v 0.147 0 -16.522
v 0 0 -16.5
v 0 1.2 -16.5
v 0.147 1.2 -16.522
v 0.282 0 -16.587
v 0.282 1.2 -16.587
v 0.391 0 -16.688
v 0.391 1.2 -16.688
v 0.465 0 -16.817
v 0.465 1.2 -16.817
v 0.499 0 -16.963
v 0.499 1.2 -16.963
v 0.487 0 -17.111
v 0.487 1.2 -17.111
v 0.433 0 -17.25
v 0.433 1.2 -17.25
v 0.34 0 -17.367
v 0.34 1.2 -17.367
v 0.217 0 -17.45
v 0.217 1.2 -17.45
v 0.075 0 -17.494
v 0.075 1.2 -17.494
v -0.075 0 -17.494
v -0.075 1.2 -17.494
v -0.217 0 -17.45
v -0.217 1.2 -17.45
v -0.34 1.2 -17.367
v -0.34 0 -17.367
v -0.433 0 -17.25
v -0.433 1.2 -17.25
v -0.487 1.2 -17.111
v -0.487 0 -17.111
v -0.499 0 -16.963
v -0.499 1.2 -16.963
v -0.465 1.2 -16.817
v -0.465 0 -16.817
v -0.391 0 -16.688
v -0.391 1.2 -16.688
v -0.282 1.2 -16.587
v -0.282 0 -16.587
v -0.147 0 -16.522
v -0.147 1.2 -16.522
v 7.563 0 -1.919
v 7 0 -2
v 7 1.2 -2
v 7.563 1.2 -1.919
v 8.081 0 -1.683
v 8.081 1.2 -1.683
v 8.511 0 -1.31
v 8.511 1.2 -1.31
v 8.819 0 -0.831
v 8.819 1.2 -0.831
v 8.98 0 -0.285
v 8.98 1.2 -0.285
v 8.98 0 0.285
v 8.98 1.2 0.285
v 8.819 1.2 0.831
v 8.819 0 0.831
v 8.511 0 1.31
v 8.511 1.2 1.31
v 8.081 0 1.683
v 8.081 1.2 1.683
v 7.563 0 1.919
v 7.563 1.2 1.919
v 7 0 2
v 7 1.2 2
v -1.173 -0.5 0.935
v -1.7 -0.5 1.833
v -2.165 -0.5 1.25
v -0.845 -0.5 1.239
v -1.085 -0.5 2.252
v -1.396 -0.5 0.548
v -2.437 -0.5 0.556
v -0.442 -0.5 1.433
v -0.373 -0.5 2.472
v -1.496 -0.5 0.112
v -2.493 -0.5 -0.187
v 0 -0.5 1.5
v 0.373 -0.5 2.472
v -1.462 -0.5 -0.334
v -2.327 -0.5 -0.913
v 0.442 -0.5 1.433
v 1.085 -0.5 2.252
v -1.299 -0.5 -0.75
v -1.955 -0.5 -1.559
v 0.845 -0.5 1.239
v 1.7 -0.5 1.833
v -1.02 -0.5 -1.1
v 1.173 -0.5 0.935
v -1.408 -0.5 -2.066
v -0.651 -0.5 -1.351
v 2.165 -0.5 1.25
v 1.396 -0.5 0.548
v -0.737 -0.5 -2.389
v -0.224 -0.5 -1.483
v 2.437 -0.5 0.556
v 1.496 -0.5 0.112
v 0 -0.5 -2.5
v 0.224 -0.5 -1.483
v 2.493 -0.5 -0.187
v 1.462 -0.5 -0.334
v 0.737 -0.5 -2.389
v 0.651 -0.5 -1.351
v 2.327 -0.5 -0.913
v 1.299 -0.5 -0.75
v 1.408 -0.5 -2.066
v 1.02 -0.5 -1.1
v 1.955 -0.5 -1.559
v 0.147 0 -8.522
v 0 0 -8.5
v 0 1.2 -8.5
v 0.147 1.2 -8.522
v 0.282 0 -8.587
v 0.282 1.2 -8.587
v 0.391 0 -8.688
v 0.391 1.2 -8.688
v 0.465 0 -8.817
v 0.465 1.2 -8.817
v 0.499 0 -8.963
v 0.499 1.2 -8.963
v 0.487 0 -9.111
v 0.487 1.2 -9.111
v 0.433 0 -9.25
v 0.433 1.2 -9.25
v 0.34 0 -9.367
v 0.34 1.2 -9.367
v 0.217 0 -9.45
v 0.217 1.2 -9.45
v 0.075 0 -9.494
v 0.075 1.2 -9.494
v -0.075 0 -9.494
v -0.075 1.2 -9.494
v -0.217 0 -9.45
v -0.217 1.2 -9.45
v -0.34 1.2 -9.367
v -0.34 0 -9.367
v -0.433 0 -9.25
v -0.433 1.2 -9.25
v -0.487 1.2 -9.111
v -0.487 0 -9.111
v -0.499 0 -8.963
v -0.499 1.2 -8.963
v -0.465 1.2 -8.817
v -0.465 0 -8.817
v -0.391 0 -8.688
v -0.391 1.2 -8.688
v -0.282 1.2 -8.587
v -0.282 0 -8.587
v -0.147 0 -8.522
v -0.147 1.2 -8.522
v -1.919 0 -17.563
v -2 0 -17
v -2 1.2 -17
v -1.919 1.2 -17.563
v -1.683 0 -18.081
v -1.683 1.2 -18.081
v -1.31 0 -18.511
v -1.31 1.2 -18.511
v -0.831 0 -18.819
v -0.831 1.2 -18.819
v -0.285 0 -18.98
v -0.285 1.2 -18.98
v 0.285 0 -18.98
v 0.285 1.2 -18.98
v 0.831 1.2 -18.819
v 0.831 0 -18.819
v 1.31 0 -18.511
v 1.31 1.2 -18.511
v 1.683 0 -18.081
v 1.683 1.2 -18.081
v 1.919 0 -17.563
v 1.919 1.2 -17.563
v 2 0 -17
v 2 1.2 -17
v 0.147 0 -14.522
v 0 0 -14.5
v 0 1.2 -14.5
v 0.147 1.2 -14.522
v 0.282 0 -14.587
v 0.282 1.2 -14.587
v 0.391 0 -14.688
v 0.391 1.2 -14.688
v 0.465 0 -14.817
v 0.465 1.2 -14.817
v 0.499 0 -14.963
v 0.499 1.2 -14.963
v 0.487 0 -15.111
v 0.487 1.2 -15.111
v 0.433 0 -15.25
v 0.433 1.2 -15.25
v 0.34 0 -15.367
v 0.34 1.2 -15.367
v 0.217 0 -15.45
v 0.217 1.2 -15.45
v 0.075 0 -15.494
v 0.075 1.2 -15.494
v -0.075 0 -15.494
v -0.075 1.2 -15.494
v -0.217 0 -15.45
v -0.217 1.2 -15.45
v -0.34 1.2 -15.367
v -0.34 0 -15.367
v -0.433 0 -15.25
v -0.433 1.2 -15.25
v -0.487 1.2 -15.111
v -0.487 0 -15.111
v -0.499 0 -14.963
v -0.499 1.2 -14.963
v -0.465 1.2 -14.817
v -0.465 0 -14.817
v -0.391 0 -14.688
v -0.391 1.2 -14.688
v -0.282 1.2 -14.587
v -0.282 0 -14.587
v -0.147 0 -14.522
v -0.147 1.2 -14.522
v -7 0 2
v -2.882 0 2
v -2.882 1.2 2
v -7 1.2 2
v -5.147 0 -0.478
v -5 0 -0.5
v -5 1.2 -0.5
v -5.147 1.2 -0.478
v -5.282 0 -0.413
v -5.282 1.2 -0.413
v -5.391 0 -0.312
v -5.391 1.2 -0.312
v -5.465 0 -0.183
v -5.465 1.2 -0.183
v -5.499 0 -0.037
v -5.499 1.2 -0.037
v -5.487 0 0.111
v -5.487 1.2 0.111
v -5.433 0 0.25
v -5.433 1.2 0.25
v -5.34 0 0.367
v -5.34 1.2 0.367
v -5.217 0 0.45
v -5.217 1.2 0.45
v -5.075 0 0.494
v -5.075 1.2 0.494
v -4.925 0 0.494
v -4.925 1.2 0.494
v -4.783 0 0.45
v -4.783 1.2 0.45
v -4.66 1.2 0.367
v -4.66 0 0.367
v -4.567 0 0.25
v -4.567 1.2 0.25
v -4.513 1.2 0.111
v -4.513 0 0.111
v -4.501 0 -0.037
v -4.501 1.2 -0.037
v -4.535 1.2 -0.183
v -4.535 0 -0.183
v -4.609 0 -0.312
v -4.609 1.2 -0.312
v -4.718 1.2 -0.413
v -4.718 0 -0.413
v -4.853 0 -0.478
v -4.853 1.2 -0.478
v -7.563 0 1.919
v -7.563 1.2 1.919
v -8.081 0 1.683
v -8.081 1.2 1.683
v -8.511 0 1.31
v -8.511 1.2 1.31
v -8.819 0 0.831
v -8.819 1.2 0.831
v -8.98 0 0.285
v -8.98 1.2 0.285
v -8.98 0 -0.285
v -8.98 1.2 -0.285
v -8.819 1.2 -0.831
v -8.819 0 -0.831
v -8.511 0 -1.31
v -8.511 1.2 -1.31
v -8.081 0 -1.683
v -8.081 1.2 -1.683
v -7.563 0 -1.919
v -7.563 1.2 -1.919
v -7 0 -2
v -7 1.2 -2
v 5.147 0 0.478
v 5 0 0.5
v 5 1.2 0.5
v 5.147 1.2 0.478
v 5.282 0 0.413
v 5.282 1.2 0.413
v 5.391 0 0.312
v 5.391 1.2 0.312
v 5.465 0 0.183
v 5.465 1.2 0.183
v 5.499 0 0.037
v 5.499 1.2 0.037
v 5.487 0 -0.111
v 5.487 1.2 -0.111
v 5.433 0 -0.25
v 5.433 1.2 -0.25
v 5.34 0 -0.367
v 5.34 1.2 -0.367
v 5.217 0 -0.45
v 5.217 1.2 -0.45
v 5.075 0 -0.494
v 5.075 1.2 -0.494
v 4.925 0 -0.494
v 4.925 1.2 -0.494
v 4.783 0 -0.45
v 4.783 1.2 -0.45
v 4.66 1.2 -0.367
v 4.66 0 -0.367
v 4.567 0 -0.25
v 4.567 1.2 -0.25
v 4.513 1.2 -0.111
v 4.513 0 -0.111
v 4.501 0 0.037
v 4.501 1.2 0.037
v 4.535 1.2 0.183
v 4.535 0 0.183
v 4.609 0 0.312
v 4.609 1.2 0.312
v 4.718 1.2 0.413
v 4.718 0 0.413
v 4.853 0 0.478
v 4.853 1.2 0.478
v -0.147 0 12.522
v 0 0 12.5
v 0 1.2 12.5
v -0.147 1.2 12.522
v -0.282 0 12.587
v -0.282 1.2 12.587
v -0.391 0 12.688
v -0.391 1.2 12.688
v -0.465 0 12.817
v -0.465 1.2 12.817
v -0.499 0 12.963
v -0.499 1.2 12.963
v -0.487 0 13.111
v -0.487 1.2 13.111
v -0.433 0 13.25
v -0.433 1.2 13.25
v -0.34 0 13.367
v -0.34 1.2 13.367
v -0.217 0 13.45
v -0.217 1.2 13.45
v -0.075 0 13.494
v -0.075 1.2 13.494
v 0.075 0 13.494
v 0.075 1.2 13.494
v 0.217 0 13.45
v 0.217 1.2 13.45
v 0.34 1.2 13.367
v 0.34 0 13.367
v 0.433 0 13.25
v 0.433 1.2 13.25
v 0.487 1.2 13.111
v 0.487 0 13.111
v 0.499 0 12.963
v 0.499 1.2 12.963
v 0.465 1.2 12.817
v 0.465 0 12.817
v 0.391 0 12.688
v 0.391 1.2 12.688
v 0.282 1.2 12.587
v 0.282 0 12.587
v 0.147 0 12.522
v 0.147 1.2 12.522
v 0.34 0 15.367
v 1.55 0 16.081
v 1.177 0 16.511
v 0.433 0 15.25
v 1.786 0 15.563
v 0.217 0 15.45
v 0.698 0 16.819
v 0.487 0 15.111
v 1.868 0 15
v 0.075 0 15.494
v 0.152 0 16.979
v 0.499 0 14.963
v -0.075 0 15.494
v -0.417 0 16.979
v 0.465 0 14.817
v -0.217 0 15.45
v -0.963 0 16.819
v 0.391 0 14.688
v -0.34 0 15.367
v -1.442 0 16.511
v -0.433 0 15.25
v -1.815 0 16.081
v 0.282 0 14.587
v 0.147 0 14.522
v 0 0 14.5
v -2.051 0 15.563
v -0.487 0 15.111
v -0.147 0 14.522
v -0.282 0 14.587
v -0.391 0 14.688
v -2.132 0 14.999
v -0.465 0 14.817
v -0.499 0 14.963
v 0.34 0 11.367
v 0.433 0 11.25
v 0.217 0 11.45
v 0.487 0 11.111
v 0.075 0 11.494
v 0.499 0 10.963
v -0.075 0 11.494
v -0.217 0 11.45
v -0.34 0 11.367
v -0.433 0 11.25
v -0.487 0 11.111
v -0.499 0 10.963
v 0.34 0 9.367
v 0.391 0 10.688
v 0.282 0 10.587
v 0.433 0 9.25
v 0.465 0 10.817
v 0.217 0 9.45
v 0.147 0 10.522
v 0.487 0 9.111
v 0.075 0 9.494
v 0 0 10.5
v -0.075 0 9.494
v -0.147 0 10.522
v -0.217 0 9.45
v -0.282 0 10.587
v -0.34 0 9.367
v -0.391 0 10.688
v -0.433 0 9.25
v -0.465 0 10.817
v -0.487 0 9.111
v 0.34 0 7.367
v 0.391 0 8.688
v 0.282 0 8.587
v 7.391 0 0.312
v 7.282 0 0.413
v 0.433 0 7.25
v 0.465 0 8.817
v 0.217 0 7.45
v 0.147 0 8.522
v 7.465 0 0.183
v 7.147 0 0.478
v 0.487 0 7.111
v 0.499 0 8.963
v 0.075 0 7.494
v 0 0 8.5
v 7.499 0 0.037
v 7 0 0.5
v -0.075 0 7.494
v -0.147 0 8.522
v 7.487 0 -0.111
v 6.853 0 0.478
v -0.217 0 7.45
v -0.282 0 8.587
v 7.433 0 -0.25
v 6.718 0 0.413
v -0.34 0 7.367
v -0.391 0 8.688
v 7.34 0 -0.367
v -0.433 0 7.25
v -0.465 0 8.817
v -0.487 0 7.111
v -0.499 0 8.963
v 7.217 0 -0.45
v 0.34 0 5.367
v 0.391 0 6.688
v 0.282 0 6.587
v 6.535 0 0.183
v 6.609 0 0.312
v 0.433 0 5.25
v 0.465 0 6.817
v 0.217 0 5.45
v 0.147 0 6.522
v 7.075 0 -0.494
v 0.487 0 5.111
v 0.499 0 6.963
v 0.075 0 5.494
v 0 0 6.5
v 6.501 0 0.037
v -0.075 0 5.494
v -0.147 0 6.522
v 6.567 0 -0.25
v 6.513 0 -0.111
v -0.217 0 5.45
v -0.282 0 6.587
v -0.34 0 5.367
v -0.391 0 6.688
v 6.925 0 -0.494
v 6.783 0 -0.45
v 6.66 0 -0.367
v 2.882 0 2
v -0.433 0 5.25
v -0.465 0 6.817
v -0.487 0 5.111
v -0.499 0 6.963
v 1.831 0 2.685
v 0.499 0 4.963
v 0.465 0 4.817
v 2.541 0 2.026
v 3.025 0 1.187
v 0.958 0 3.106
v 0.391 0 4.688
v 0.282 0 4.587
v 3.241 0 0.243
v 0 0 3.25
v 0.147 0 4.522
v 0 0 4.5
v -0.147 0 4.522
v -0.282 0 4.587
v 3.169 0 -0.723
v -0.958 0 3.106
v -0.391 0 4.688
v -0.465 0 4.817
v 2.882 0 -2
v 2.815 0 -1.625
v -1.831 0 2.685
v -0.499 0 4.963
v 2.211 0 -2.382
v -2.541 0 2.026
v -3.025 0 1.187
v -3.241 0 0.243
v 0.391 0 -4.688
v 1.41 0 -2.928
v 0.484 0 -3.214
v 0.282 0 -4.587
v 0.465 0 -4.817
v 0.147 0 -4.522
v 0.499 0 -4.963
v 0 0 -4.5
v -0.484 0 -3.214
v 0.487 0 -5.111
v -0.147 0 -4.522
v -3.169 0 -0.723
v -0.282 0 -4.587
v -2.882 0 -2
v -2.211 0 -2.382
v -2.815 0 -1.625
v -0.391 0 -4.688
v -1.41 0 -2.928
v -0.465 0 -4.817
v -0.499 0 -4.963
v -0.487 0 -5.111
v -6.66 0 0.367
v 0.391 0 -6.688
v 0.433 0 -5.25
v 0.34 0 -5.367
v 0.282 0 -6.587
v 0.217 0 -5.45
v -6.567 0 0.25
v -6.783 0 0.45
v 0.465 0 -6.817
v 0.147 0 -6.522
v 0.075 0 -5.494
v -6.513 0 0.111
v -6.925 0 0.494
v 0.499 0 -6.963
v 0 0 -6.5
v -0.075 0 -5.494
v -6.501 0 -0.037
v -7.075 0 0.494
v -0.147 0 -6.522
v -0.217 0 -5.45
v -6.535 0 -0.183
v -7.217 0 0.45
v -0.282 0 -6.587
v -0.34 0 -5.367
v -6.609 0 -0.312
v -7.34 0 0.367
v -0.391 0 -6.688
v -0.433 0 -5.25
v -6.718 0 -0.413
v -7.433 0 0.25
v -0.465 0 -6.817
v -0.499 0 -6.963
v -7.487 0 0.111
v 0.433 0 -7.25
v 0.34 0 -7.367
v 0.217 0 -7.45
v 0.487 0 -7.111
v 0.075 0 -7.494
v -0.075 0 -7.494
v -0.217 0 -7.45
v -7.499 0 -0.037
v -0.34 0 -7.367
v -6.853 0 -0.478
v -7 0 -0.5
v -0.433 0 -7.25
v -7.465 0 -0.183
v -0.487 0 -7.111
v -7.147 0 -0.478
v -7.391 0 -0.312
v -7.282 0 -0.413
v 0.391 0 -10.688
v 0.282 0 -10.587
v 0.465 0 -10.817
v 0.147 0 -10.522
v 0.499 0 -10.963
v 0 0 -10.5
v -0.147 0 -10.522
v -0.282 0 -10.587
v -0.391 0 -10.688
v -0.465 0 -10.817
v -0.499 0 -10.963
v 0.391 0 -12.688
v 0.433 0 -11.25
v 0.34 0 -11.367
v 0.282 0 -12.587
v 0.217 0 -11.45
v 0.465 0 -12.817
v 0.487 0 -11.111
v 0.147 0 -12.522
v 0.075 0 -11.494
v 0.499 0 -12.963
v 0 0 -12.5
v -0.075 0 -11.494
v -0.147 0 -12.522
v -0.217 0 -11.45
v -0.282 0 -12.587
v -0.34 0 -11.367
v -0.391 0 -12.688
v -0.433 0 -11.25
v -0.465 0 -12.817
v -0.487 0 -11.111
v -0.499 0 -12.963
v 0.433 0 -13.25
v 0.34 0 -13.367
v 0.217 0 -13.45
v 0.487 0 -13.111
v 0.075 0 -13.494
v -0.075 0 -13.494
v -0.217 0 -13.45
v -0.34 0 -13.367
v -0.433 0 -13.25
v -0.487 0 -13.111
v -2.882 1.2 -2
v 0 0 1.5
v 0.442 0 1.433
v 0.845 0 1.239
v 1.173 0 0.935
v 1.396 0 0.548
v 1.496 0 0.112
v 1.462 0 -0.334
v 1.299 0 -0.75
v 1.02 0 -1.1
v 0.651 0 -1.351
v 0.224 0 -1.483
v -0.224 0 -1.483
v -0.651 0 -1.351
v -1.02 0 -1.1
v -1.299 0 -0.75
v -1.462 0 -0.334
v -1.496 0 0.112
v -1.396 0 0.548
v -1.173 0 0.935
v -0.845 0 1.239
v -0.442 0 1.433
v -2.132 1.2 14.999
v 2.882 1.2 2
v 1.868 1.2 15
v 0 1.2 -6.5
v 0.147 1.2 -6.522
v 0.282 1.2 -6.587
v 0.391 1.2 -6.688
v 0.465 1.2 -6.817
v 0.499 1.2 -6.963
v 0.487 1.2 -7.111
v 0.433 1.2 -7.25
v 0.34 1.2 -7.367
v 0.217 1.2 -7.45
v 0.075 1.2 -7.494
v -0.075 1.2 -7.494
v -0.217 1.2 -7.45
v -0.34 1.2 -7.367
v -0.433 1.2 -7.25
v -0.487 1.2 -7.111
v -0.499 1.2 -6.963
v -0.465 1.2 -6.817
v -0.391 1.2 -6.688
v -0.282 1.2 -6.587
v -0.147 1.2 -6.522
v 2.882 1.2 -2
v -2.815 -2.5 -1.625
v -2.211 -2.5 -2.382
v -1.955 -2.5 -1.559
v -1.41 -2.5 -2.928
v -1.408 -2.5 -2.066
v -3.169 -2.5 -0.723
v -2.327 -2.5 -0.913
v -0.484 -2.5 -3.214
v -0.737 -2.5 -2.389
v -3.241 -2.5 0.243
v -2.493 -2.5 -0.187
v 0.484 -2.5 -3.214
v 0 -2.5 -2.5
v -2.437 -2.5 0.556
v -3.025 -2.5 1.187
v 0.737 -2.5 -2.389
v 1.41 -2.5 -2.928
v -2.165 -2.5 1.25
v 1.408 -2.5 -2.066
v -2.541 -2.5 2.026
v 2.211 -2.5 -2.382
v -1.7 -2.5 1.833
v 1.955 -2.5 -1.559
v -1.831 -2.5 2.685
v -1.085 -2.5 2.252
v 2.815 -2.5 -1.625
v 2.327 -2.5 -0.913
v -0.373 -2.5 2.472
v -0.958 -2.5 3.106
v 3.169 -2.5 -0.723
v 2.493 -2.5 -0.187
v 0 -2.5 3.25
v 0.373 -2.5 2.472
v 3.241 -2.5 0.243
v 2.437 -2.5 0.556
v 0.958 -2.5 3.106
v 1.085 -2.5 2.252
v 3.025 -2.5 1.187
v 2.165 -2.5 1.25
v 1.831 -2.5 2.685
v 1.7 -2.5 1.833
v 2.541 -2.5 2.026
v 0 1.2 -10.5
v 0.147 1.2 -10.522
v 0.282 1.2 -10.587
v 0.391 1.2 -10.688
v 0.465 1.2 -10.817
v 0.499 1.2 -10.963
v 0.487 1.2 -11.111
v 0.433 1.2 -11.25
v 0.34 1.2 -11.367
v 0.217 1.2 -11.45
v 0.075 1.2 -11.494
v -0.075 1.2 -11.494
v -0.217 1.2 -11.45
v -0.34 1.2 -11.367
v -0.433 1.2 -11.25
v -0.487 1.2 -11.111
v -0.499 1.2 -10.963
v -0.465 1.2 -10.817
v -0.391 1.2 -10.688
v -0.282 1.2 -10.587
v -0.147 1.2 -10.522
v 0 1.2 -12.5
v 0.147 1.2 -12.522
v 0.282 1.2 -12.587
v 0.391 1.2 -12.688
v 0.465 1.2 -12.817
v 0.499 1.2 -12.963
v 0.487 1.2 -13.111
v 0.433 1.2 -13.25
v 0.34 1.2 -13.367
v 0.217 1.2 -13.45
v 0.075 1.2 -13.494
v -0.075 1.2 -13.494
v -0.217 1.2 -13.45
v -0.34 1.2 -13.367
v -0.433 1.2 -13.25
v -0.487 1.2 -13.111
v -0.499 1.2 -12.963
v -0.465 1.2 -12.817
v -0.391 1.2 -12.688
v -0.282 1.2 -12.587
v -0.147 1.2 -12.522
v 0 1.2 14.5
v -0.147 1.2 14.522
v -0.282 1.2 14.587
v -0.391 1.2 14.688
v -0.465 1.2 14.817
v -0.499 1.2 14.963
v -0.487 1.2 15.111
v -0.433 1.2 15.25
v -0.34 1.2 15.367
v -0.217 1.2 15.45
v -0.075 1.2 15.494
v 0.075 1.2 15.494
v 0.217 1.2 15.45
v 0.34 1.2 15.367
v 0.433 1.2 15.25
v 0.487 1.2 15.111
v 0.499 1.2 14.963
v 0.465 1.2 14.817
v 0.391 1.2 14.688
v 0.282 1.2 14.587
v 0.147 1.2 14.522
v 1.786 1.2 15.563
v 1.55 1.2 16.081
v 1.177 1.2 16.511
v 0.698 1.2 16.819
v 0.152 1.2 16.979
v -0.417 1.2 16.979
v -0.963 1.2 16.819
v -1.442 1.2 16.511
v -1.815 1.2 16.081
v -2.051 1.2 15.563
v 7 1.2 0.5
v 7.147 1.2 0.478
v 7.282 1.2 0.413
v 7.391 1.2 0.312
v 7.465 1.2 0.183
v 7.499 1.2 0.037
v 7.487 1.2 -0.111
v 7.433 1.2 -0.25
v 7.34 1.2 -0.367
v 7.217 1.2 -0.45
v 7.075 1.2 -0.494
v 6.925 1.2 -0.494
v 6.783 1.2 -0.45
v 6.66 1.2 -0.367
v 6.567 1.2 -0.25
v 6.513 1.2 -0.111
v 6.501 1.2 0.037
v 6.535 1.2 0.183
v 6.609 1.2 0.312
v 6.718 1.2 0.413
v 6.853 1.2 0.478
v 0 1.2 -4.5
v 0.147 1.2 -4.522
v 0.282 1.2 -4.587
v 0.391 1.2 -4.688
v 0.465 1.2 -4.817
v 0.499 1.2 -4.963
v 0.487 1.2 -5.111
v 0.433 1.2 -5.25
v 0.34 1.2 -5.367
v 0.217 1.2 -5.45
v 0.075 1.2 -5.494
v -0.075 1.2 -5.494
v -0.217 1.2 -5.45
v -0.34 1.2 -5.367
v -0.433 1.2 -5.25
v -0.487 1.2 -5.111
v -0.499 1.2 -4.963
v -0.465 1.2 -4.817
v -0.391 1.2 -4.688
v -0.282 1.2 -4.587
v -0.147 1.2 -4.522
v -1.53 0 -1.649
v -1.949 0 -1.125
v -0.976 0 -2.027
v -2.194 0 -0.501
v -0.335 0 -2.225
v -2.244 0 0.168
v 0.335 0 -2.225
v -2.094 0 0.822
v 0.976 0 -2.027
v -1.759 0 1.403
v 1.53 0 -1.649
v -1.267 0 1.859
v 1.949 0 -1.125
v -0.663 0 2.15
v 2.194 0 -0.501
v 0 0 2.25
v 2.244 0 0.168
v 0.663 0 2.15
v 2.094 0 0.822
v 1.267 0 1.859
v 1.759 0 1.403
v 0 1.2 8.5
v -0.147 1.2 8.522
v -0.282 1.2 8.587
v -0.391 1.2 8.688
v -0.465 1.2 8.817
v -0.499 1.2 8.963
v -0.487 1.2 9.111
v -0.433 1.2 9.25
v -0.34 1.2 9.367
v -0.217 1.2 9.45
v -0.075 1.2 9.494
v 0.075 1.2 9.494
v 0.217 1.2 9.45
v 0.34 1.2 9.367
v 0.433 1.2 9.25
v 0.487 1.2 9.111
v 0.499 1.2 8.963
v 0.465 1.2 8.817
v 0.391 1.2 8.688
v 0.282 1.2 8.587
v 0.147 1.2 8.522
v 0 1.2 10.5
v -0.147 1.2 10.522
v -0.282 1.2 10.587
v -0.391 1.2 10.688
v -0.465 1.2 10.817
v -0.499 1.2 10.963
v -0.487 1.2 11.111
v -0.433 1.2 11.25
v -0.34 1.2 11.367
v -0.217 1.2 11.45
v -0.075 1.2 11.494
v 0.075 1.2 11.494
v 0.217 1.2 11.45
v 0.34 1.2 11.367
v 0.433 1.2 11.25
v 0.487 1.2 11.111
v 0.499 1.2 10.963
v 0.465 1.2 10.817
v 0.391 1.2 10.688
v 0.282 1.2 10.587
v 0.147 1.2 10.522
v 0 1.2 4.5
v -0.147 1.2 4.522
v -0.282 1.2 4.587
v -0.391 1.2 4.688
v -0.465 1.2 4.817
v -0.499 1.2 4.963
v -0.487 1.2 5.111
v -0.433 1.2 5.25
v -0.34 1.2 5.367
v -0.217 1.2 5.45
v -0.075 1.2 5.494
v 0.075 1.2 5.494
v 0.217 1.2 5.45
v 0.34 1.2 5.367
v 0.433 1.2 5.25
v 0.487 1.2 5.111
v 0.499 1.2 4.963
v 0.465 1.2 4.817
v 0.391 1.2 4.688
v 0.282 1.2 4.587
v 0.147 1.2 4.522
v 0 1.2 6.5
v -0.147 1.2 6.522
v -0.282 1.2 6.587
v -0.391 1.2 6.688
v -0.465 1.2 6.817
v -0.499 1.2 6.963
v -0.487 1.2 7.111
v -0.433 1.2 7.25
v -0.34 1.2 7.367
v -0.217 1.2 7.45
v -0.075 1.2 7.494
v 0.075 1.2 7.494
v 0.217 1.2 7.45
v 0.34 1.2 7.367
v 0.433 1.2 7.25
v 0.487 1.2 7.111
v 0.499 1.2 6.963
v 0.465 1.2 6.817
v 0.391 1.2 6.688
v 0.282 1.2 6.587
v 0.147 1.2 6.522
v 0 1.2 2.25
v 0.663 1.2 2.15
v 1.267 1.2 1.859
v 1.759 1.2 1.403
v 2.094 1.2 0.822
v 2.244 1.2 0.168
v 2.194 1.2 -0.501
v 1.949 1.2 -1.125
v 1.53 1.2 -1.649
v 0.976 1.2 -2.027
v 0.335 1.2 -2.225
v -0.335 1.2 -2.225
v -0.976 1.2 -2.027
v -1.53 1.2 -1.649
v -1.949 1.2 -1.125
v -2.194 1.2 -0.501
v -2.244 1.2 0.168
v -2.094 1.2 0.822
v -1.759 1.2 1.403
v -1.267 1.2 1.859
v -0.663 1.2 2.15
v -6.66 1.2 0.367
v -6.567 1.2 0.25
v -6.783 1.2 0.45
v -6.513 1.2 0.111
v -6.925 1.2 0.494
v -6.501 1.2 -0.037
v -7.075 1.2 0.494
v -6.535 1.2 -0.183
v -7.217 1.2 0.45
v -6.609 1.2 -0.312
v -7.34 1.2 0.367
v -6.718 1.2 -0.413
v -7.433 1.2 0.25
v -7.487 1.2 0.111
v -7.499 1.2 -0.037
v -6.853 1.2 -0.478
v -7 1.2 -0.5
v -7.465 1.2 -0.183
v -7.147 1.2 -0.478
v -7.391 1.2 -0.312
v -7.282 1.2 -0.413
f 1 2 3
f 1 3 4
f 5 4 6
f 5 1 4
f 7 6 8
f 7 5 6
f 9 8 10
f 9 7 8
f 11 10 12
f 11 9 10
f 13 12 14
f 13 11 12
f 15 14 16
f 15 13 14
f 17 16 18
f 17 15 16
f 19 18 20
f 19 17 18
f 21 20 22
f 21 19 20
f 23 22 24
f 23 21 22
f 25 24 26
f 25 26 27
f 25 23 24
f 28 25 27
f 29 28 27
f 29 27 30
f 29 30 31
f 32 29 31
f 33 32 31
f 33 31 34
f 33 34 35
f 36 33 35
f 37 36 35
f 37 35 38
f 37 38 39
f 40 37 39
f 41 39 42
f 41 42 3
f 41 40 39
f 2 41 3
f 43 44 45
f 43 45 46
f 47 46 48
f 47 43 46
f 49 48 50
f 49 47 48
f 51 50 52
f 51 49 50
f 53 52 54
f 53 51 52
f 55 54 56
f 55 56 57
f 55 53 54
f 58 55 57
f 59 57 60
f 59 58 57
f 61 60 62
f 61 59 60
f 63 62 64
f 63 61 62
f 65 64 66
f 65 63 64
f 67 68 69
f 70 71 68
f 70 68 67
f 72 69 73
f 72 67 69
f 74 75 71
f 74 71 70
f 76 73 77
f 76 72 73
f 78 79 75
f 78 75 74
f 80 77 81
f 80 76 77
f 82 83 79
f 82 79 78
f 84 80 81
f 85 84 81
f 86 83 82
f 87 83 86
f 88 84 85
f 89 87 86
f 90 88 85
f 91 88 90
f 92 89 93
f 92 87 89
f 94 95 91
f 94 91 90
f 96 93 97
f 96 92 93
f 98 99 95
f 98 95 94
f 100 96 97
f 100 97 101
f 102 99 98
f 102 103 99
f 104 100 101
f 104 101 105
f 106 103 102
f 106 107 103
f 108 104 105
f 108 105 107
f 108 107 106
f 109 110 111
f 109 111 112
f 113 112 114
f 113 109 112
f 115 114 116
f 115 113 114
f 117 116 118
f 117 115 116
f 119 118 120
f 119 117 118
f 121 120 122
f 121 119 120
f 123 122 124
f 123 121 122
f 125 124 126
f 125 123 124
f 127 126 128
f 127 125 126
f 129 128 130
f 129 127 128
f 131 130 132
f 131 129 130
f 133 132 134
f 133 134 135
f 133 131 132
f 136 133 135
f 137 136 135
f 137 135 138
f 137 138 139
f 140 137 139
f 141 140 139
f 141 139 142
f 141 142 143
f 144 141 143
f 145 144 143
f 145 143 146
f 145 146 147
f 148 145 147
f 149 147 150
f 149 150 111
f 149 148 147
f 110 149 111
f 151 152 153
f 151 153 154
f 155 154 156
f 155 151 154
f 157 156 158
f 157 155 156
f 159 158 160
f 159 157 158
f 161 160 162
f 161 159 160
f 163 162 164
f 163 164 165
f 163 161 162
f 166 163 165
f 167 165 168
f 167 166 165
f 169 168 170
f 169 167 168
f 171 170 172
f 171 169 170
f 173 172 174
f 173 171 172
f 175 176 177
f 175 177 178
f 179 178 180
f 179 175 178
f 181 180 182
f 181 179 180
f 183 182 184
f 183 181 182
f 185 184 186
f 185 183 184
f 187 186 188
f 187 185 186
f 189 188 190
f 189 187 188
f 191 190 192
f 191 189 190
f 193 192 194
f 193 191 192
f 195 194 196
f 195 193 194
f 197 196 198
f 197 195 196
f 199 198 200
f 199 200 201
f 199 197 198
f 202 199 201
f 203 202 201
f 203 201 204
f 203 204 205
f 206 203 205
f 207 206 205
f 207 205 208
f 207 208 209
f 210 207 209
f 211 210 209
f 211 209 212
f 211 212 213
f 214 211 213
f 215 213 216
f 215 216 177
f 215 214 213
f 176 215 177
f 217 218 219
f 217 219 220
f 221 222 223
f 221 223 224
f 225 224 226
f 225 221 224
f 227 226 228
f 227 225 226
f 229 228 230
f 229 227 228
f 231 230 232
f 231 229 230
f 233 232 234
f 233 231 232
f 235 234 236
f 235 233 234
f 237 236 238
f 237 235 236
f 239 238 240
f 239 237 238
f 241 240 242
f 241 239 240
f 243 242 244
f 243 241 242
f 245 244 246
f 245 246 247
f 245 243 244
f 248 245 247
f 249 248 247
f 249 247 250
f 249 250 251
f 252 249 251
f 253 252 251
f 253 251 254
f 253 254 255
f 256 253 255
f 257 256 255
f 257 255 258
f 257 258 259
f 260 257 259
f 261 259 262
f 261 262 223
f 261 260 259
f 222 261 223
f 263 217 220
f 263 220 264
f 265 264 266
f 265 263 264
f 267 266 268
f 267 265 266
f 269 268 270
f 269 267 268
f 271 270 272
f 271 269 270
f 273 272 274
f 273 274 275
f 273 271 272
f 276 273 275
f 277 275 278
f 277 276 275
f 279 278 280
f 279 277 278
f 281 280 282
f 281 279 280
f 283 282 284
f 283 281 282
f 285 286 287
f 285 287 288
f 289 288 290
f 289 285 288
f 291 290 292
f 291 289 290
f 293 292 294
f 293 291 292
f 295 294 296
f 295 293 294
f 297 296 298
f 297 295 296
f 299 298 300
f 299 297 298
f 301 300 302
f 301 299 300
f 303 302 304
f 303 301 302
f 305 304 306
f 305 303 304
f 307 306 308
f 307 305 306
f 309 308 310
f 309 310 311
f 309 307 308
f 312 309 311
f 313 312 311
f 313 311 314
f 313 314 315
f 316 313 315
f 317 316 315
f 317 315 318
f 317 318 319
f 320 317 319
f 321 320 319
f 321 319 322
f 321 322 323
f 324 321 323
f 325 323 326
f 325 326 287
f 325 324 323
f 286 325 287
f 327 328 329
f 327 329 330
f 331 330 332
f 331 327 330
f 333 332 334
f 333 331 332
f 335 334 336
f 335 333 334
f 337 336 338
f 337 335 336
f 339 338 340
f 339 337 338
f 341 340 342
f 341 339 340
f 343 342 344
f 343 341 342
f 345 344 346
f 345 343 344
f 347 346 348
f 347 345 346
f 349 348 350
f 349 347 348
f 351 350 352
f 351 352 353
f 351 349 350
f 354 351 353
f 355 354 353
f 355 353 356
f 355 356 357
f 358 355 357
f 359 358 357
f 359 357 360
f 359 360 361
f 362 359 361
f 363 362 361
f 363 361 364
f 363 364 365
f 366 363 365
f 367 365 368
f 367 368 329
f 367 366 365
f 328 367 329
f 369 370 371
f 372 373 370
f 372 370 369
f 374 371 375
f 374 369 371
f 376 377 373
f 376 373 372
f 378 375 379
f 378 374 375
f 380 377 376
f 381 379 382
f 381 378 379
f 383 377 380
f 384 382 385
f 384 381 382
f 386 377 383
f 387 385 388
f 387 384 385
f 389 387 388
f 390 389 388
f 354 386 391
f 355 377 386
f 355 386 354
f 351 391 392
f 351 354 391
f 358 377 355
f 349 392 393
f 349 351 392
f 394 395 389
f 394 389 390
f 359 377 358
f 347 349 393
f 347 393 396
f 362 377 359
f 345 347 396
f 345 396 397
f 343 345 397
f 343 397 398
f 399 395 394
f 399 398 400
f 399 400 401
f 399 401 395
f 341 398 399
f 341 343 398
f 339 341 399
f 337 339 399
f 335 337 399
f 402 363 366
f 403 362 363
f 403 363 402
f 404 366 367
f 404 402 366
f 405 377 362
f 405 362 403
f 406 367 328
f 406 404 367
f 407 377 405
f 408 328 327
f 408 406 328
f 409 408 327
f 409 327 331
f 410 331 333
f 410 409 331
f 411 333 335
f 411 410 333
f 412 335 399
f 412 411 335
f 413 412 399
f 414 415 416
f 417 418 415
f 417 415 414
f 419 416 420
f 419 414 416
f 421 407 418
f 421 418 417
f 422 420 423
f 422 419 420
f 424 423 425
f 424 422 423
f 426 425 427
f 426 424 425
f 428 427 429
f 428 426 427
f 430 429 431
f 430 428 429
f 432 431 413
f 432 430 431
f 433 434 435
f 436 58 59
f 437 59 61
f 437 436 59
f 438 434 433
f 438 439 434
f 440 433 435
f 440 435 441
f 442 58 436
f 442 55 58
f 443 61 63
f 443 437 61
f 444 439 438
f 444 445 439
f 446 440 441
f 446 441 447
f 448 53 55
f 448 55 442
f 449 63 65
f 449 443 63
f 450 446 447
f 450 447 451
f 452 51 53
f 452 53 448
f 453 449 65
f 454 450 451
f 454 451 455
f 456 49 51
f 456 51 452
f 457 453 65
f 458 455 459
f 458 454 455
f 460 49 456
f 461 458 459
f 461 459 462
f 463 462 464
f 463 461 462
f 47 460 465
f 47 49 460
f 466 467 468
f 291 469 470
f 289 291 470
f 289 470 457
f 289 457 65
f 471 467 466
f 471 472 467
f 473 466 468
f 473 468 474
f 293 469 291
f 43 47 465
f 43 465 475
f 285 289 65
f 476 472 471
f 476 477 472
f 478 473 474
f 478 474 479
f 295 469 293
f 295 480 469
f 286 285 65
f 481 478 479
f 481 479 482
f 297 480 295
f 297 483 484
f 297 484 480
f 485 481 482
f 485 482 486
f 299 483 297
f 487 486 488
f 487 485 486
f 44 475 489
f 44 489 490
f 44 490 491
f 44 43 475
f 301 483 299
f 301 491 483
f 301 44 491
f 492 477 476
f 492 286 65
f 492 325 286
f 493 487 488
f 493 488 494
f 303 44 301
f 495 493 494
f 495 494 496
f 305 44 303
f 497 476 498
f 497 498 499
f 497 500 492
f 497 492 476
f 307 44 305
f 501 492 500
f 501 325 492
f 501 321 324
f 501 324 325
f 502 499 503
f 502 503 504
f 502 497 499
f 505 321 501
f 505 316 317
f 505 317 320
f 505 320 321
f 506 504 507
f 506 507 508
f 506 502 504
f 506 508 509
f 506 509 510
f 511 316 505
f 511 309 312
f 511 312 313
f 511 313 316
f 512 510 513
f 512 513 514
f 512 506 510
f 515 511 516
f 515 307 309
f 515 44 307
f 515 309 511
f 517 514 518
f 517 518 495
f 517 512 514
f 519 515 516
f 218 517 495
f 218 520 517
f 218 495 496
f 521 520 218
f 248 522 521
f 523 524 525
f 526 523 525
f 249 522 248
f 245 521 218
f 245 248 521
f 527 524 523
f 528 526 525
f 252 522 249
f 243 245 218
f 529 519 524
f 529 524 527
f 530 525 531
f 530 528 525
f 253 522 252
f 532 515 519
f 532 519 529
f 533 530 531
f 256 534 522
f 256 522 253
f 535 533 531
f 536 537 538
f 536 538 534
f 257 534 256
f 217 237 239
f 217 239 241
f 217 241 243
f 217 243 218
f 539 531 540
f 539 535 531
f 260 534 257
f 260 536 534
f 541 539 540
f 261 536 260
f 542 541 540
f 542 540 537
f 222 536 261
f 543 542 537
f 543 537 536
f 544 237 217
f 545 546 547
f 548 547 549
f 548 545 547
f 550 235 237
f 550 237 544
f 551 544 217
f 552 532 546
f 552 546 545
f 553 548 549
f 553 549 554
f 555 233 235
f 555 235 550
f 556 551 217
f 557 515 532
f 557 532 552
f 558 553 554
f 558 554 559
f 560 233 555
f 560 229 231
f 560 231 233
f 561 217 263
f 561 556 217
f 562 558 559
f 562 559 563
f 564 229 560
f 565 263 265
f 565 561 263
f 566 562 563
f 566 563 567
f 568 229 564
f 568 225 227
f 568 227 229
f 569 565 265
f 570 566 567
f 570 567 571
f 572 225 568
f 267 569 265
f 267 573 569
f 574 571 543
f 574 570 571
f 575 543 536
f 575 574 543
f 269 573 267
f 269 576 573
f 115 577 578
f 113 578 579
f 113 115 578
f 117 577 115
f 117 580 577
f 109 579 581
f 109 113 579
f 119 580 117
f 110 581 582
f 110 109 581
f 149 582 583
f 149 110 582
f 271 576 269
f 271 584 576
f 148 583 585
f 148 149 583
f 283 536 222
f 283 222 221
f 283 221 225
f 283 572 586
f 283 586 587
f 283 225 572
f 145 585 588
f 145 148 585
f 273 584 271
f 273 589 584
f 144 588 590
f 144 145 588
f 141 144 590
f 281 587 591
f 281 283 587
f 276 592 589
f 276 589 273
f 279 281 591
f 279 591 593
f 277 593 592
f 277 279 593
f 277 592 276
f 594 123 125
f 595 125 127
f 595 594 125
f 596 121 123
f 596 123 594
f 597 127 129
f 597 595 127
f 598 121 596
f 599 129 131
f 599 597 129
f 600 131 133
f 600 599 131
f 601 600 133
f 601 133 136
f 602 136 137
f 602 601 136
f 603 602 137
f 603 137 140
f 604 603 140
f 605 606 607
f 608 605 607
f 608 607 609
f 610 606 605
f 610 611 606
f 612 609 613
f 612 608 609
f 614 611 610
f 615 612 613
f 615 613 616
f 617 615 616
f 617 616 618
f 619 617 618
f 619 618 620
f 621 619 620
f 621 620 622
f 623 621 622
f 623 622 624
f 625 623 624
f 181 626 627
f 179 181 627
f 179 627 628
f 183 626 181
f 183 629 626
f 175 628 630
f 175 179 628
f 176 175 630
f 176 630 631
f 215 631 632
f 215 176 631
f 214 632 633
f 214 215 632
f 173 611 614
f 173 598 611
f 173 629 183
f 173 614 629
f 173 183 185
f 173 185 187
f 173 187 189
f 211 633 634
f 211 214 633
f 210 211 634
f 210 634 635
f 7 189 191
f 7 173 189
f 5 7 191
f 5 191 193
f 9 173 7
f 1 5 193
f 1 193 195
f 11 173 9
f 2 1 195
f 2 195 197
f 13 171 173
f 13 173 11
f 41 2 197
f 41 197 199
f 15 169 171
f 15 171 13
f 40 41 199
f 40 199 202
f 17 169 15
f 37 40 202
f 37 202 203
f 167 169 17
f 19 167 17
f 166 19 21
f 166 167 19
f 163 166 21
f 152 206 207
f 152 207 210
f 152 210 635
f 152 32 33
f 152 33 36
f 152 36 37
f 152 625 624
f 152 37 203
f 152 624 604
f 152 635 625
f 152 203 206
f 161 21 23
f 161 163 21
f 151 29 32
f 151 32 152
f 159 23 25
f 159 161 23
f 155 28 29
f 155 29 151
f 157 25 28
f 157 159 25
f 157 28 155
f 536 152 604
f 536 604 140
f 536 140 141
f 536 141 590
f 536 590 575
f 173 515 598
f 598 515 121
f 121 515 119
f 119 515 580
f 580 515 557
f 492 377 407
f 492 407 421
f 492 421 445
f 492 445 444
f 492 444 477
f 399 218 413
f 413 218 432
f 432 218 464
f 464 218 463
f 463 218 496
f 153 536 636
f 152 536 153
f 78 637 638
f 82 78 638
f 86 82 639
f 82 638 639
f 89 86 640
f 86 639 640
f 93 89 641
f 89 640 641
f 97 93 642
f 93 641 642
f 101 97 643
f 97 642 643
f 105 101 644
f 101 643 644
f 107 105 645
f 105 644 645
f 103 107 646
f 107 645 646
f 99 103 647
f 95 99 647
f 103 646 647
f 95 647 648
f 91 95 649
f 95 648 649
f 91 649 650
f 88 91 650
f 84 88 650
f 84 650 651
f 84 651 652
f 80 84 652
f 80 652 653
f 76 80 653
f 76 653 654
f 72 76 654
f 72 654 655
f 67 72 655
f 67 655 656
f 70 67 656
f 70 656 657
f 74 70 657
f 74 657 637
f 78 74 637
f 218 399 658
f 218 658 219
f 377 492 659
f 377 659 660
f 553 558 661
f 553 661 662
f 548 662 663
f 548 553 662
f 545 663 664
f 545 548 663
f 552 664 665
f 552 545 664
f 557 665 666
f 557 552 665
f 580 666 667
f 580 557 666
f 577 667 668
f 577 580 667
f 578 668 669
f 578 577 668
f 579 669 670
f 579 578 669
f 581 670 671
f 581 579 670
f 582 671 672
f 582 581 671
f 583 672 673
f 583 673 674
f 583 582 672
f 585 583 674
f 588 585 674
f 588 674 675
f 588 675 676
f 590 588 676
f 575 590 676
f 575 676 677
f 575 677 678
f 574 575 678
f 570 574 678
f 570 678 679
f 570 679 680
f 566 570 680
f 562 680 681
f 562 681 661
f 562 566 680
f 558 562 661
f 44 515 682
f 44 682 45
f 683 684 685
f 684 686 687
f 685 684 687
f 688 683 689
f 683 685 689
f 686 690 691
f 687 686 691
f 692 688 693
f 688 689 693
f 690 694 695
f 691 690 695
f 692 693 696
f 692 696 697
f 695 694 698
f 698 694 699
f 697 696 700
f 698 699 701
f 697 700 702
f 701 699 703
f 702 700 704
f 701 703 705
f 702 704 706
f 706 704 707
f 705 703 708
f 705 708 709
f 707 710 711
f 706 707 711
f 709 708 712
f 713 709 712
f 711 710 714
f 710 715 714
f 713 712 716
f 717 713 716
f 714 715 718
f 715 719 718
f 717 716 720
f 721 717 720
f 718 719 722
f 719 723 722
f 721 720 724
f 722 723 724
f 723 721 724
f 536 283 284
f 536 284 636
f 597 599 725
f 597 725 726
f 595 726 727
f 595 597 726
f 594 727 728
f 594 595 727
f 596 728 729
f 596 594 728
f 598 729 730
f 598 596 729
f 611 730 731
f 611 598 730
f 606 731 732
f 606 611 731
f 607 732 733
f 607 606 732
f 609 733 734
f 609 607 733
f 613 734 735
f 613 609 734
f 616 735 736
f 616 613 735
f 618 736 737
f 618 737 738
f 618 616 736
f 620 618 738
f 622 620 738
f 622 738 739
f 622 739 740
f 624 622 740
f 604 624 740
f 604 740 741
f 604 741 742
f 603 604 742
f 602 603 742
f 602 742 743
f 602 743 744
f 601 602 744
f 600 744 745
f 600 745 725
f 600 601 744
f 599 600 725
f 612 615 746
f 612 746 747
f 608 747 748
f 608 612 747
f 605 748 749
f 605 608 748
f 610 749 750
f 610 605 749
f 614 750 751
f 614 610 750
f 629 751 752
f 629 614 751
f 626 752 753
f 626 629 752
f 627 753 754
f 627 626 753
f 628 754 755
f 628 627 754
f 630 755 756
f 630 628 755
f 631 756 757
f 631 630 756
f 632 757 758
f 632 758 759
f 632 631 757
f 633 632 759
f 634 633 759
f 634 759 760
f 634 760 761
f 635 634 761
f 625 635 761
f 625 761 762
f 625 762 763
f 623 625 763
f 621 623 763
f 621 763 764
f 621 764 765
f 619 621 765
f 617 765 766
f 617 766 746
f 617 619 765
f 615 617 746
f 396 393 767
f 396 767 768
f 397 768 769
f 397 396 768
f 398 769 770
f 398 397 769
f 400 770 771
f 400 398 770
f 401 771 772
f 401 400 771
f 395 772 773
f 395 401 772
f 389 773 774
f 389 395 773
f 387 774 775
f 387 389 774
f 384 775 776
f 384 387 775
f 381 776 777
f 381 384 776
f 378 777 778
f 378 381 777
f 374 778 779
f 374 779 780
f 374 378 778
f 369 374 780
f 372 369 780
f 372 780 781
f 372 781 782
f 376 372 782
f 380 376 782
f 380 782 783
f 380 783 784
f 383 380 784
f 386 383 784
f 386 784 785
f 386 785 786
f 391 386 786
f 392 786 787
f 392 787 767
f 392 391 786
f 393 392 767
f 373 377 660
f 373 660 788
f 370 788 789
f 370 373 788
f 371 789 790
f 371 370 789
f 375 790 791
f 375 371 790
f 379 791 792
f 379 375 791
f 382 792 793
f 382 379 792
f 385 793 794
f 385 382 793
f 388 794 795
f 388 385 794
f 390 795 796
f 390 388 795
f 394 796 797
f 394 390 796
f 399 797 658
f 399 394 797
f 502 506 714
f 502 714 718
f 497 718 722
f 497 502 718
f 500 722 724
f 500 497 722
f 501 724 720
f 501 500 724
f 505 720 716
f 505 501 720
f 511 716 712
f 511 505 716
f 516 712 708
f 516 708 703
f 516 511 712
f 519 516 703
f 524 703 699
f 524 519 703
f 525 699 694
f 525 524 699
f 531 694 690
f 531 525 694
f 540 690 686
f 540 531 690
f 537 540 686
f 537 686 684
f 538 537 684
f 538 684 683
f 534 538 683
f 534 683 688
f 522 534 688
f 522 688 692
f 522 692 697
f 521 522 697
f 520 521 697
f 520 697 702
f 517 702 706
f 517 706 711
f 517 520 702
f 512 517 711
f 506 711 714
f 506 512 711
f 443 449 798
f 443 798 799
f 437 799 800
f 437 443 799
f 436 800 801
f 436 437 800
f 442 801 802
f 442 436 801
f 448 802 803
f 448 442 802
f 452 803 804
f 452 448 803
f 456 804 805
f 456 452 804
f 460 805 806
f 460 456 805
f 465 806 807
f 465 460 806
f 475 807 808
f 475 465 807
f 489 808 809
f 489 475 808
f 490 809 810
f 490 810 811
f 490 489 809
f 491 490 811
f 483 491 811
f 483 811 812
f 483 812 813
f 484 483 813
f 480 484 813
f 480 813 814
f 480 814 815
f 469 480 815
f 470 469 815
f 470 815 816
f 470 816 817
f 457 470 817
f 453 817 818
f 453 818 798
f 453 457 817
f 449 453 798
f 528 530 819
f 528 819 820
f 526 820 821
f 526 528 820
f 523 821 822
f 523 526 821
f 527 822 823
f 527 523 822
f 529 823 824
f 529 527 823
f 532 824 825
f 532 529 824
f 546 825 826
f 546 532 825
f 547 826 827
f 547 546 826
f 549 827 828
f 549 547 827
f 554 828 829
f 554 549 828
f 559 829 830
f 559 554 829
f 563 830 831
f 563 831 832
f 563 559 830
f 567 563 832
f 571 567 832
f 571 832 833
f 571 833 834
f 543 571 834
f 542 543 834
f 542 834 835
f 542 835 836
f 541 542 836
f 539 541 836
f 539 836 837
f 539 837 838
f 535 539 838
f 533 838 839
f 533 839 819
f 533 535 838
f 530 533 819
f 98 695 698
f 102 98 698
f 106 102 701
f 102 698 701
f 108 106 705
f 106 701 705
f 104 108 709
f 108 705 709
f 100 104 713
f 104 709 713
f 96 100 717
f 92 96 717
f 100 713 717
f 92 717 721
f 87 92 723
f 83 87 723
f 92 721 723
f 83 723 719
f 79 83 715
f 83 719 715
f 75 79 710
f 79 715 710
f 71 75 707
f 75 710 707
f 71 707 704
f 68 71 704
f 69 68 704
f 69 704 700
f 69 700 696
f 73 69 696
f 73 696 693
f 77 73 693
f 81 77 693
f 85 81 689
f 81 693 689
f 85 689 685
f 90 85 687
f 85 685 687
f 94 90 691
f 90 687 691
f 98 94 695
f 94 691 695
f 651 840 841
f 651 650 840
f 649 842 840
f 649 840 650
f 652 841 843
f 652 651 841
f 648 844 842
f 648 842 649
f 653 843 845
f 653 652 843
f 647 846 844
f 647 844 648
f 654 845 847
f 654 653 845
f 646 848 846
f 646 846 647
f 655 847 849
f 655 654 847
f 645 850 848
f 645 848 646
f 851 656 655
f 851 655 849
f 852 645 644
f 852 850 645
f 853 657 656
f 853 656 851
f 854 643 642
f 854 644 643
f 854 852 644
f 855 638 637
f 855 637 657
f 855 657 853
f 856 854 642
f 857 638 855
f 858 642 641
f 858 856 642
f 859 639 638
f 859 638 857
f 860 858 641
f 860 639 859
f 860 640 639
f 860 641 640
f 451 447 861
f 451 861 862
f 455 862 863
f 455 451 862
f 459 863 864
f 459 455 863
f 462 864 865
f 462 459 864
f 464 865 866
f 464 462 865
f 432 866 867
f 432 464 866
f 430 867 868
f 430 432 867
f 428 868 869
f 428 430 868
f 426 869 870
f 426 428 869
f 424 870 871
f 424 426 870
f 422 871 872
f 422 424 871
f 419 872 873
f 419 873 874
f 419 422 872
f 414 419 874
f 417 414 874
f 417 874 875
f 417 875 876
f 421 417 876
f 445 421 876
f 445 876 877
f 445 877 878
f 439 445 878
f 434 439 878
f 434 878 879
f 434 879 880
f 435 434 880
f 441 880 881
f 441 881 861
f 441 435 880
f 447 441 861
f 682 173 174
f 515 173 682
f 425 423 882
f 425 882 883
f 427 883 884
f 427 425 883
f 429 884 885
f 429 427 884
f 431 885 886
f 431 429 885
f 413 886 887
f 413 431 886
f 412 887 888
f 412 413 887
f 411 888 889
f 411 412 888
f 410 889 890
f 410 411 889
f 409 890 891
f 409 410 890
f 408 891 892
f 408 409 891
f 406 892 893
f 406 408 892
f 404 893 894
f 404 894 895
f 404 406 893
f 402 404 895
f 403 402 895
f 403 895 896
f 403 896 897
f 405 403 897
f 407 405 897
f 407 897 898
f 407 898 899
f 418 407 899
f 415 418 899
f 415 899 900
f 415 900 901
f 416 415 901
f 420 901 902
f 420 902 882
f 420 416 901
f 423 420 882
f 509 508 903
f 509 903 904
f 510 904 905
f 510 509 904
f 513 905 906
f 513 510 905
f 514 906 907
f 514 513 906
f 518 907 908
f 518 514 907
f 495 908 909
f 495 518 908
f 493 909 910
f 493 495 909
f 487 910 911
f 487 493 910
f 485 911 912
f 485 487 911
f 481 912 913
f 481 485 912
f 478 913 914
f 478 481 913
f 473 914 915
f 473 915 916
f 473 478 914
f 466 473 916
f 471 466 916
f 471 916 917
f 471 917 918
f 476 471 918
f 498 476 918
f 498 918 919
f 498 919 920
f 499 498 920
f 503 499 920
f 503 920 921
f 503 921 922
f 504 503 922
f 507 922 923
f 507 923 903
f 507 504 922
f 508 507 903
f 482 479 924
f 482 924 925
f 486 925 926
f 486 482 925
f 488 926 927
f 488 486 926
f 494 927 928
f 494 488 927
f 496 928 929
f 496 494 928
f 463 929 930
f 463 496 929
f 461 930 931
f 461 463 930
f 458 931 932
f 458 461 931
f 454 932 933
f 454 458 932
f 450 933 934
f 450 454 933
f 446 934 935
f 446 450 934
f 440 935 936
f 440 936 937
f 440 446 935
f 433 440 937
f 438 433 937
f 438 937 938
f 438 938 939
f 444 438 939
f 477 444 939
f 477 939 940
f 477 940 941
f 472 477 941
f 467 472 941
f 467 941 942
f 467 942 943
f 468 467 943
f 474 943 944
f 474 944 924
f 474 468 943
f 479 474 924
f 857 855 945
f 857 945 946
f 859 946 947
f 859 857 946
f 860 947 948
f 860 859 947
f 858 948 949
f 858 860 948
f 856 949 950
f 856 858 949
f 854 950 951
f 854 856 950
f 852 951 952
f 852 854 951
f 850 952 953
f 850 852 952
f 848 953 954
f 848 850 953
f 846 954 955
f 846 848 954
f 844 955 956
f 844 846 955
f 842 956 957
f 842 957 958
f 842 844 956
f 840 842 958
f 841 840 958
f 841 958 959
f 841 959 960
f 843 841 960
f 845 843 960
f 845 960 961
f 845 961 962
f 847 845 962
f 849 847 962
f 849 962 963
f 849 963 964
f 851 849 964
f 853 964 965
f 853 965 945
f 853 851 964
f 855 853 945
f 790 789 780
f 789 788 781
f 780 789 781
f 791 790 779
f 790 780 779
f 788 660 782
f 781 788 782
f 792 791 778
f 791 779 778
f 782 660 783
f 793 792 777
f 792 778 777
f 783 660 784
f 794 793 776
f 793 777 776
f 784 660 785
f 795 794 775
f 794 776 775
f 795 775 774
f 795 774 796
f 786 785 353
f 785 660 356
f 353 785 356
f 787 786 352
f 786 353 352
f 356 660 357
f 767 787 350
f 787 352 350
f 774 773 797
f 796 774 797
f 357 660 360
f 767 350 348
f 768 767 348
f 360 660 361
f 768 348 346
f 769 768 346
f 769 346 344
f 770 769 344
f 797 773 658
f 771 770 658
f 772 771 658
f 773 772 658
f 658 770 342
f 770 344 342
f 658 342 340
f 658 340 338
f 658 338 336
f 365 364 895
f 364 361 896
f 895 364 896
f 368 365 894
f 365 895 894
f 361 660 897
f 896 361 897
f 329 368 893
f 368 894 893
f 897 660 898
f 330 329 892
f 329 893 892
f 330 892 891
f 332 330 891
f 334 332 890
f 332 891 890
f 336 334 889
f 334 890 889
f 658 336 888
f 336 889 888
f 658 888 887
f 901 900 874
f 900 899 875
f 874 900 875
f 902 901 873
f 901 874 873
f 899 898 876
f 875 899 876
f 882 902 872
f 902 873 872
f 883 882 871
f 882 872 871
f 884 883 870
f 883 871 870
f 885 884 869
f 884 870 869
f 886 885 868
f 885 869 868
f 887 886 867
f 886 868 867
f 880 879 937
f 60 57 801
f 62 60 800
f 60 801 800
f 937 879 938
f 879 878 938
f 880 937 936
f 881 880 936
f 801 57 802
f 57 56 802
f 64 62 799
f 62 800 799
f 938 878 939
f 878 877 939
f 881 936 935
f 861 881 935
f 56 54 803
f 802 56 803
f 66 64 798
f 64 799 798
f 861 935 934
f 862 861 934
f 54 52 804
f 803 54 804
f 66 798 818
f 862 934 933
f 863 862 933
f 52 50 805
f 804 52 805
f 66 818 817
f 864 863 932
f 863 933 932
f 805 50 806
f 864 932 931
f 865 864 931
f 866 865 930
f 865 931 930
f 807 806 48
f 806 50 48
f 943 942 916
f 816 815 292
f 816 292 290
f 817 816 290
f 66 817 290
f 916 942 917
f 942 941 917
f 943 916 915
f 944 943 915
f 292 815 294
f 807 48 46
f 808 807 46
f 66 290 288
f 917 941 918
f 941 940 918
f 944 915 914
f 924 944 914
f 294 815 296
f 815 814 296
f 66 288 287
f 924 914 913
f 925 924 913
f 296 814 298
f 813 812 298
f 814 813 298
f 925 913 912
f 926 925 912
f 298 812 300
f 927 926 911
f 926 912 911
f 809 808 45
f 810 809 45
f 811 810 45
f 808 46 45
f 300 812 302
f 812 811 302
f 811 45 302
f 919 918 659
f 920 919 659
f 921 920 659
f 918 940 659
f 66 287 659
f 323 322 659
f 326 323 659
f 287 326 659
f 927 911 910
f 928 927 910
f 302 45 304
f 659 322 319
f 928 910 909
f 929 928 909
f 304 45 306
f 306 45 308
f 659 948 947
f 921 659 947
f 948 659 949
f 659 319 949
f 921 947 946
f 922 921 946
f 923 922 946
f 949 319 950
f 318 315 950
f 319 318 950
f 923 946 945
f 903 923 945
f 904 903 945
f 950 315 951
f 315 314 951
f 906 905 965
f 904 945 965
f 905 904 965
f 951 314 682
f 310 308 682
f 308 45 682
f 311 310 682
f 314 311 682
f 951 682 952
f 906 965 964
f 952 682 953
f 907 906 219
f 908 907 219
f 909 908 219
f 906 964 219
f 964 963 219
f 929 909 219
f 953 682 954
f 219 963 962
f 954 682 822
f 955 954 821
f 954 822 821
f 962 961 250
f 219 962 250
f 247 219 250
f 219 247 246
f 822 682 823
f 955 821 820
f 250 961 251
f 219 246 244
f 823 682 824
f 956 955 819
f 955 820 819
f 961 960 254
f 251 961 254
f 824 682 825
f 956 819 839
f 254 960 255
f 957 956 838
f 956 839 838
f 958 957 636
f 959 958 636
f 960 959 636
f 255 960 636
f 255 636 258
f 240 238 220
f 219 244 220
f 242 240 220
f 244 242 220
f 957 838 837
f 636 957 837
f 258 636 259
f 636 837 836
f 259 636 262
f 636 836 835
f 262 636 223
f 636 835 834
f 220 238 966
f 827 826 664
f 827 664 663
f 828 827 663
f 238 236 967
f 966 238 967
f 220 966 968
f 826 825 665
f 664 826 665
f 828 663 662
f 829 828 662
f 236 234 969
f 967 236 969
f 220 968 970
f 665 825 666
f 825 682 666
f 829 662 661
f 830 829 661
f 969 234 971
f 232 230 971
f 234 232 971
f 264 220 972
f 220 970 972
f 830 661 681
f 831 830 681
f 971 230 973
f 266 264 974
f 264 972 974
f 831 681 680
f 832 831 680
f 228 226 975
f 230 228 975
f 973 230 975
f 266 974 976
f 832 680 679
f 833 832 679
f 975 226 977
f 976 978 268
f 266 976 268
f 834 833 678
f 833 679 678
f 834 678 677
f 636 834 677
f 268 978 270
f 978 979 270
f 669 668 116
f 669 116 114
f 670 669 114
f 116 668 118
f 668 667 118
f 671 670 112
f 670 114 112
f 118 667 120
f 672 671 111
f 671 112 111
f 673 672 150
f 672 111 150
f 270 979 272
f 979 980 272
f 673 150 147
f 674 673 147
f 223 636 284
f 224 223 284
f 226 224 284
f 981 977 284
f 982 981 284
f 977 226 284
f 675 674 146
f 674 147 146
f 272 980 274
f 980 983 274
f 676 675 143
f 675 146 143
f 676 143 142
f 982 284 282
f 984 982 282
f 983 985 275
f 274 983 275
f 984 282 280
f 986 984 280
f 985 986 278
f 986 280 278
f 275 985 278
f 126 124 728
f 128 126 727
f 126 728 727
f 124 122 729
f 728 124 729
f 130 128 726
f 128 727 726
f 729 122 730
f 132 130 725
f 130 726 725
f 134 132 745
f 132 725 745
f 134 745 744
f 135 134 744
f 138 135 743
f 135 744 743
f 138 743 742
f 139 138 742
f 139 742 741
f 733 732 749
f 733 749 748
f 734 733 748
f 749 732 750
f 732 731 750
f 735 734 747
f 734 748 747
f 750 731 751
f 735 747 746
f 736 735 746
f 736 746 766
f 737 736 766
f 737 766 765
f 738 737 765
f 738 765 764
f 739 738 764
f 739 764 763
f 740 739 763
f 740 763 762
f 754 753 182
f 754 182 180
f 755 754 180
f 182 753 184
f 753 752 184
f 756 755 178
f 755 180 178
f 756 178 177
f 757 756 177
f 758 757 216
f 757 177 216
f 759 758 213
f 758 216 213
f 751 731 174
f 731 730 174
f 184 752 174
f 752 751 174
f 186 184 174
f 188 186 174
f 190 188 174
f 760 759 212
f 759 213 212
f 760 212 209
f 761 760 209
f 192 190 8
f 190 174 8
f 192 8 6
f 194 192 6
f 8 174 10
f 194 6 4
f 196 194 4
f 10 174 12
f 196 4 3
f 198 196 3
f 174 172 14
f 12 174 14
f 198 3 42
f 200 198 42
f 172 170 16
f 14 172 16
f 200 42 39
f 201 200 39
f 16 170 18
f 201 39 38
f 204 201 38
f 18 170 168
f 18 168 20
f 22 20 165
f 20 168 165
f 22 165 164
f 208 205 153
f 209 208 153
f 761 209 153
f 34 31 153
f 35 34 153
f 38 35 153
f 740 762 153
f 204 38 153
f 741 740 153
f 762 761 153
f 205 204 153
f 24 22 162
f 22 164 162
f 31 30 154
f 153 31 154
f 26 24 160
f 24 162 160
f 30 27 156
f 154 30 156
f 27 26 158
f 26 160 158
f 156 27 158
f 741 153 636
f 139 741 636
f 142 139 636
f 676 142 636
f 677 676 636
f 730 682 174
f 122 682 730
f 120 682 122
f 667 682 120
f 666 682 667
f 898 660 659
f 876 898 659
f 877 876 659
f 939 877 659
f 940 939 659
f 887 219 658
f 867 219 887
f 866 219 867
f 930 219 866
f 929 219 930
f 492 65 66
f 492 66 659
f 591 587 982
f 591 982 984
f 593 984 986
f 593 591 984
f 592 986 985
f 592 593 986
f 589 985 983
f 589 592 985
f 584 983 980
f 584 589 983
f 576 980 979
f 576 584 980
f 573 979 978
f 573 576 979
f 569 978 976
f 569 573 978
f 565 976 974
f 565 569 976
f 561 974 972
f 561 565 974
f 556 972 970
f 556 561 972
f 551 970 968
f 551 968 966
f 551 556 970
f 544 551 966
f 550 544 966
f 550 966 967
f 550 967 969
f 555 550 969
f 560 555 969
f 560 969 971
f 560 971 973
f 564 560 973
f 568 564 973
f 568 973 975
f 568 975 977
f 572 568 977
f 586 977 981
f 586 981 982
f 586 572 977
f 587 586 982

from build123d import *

# Parameters (mm, degrees)
SKETCH1_R           = 0.5
SKETCH1_R_2         = 2.25
BOSS_EXTRUDE1_DEPTH = 1.2
SKETCH2_R           = 3.25
SKETCH2_R_2         = 1.5
BOSS_EXTRUDE2_DEPTH = 2.5
SKETCH3_R           = 2.5
CUT_EXTRUDE1_DEPTH  = 2


with BuildPart() as part:
    # Sketch1 → Boss-Extrude1 (new body)
    with BuildSketch(Plane(origin=(0, 0, 0), x_dir=(1, 0, 0), z_dir=(0, 1, 0))):
        with BuildLine():
            Line((-2.882352941, 2), (-2, 17))
            ThreePointArc((-2, 17), (0, 19), (2, 17))
            Line((2, 17), (2.882352941, 2))
            Line((2.882352941, 2), (7, 2))
            ThreePointArc((7, 2), (9, 0), (7, -2))
            Line((7, -2), (2.882352941, -2))
            Line((2.882352941, -2), (1.867646984, -14.999963756))
            ThreePointArc((1.867646984, -14.999963756), (-0.132626782, -16.99941606), (-2.132352941, -14.999416075))
            Line((-2.132352941, -14.999416075), (-2.882352941, -2))
            Line((-2.882352941, -2), (-7, -2))
            ThreePointArc((-7, -2), (-9, 0), (-7, 2))
            Line((-7, 2), (-2.882352941, 2))
        make_face()
        with Locations(Location((0, 5, 0), (0, 0, 270))):
            Circle(SKETCH1_R, mode=Mode.SUBTRACT)
        with Locations(Location((0, 7, 0), (0, 0, 270))):
            Circle(SKETCH1_R, mode=Mode.SUBTRACT)
        with Locations(Location((0, 9, 0), (0, 0, 270))):
            Circle(SKETCH1_R, mode=Mode.SUBTRACT)
        with Locations(Location((0, 11, 0), (0, 0, 270))):
            Circle(SKETCH1_R, mode=Mode.SUBTRACT)
        with Locations(Location((0, 13, 0), (0, 0, 270))):
            Circle(SKETCH1_R, mode=Mode.SUBTRACT)
        with Locations(Location((0, 15, 0), (0, 0, 270))):
            Circle(SKETCH1_R, mode=Mode.SUBTRACT)
        with Locations(Location((0, 17, 0), (0, 0, 270))):
            Circle(SKETCH1_R, mode=Mode.SUBTRACT)
        with Locations(Location((0, -15, 0), (0, 0, 90))):
            Circle(SKETCH1_R, mode=Mode.SUBTRACT)
        with Locations(Location((0, -13, 0), (0, 0, 90))):
            Circle(SKETCH1_R, mode=Mode.SUBTRACT)
        with Locations(Location((0, -11, 0), (0, 0, 90))):
            Circle(SKETCH1_R, mode=Mode.SUBTRACT)
        with Locations(Location((0, -9, 0), (0, 0, 90))):
            Circle(SKETCH1_R, mode=Mode.SUBTRACT)
        with Locations(Location((0, -7, 0), (0, 0, 90))):
            Circle(SKETCH1_R, mode=Mode.SUBTRACT)
        with Locations(Location((0, -5, 0), (0, 0, 90))):
            Circle(SKETCH1_R, mode=Mode.SUBTRACT)
        with Locations(Location((7, 0, 0), (0, 0, 270))):
            Circle(SKETCH1_R, mode=Mode.SUBTRACT)
        with Locations(Location((5, 0, 0), (0, 0, 270))):
            Circle(SKETCH1_R, mode=Mode.SUBTRACT)
        with Locations(Location((-5, 0, 0), (0, 0, 90))):
            Circle(SKETCH1_R, mode=Mode.SUBTRACT)
        with Locations(Location((-7, 0, 0), (0, 0, 90))):
            Circle(SKETCH1_R, mode=Mode.SUBTRACT)
        with Locations(Location((0, 0, 0), (0, 0, 270))):
            Circle(SKETCH1_R_2, mode=Mode.SUBTRACT)
    extrude(amount=BOSS_EXTRUDE1_DEPTH)

    # Sketch2 → Boss-Extrude2 (add)
    with BuildSketch(Plane(origin=(0, 0, 0), x_dir=(1, 0, 0), z_dir=(0, 1, 0))):
        with Locations(Location((0, 0, 0), (0, 0, 270))):
            Circle(SKETCH2_R)
        with Locations(Location((0, 0, 0), (0, 0, 270))):
            Circle(SKETCH2_R_2, mode=Mode.SUBTRACT)
    extrude(amount=-BOSS_EXTRUDE2_DEPTH)

    # Sketch3 → Cut-Extrude1 (cut)
    with BuildSketch(Plane.XZ.offset(2.5)):
        with Locations(Location((0, 0, 0), (0, 0, 270))):
            Circle(SKETCH3_R)
    extrude(amount=-CUT_EXTRUDE1_DEPTH, mode=Mode.SUBTRACT)


solid = part.part
